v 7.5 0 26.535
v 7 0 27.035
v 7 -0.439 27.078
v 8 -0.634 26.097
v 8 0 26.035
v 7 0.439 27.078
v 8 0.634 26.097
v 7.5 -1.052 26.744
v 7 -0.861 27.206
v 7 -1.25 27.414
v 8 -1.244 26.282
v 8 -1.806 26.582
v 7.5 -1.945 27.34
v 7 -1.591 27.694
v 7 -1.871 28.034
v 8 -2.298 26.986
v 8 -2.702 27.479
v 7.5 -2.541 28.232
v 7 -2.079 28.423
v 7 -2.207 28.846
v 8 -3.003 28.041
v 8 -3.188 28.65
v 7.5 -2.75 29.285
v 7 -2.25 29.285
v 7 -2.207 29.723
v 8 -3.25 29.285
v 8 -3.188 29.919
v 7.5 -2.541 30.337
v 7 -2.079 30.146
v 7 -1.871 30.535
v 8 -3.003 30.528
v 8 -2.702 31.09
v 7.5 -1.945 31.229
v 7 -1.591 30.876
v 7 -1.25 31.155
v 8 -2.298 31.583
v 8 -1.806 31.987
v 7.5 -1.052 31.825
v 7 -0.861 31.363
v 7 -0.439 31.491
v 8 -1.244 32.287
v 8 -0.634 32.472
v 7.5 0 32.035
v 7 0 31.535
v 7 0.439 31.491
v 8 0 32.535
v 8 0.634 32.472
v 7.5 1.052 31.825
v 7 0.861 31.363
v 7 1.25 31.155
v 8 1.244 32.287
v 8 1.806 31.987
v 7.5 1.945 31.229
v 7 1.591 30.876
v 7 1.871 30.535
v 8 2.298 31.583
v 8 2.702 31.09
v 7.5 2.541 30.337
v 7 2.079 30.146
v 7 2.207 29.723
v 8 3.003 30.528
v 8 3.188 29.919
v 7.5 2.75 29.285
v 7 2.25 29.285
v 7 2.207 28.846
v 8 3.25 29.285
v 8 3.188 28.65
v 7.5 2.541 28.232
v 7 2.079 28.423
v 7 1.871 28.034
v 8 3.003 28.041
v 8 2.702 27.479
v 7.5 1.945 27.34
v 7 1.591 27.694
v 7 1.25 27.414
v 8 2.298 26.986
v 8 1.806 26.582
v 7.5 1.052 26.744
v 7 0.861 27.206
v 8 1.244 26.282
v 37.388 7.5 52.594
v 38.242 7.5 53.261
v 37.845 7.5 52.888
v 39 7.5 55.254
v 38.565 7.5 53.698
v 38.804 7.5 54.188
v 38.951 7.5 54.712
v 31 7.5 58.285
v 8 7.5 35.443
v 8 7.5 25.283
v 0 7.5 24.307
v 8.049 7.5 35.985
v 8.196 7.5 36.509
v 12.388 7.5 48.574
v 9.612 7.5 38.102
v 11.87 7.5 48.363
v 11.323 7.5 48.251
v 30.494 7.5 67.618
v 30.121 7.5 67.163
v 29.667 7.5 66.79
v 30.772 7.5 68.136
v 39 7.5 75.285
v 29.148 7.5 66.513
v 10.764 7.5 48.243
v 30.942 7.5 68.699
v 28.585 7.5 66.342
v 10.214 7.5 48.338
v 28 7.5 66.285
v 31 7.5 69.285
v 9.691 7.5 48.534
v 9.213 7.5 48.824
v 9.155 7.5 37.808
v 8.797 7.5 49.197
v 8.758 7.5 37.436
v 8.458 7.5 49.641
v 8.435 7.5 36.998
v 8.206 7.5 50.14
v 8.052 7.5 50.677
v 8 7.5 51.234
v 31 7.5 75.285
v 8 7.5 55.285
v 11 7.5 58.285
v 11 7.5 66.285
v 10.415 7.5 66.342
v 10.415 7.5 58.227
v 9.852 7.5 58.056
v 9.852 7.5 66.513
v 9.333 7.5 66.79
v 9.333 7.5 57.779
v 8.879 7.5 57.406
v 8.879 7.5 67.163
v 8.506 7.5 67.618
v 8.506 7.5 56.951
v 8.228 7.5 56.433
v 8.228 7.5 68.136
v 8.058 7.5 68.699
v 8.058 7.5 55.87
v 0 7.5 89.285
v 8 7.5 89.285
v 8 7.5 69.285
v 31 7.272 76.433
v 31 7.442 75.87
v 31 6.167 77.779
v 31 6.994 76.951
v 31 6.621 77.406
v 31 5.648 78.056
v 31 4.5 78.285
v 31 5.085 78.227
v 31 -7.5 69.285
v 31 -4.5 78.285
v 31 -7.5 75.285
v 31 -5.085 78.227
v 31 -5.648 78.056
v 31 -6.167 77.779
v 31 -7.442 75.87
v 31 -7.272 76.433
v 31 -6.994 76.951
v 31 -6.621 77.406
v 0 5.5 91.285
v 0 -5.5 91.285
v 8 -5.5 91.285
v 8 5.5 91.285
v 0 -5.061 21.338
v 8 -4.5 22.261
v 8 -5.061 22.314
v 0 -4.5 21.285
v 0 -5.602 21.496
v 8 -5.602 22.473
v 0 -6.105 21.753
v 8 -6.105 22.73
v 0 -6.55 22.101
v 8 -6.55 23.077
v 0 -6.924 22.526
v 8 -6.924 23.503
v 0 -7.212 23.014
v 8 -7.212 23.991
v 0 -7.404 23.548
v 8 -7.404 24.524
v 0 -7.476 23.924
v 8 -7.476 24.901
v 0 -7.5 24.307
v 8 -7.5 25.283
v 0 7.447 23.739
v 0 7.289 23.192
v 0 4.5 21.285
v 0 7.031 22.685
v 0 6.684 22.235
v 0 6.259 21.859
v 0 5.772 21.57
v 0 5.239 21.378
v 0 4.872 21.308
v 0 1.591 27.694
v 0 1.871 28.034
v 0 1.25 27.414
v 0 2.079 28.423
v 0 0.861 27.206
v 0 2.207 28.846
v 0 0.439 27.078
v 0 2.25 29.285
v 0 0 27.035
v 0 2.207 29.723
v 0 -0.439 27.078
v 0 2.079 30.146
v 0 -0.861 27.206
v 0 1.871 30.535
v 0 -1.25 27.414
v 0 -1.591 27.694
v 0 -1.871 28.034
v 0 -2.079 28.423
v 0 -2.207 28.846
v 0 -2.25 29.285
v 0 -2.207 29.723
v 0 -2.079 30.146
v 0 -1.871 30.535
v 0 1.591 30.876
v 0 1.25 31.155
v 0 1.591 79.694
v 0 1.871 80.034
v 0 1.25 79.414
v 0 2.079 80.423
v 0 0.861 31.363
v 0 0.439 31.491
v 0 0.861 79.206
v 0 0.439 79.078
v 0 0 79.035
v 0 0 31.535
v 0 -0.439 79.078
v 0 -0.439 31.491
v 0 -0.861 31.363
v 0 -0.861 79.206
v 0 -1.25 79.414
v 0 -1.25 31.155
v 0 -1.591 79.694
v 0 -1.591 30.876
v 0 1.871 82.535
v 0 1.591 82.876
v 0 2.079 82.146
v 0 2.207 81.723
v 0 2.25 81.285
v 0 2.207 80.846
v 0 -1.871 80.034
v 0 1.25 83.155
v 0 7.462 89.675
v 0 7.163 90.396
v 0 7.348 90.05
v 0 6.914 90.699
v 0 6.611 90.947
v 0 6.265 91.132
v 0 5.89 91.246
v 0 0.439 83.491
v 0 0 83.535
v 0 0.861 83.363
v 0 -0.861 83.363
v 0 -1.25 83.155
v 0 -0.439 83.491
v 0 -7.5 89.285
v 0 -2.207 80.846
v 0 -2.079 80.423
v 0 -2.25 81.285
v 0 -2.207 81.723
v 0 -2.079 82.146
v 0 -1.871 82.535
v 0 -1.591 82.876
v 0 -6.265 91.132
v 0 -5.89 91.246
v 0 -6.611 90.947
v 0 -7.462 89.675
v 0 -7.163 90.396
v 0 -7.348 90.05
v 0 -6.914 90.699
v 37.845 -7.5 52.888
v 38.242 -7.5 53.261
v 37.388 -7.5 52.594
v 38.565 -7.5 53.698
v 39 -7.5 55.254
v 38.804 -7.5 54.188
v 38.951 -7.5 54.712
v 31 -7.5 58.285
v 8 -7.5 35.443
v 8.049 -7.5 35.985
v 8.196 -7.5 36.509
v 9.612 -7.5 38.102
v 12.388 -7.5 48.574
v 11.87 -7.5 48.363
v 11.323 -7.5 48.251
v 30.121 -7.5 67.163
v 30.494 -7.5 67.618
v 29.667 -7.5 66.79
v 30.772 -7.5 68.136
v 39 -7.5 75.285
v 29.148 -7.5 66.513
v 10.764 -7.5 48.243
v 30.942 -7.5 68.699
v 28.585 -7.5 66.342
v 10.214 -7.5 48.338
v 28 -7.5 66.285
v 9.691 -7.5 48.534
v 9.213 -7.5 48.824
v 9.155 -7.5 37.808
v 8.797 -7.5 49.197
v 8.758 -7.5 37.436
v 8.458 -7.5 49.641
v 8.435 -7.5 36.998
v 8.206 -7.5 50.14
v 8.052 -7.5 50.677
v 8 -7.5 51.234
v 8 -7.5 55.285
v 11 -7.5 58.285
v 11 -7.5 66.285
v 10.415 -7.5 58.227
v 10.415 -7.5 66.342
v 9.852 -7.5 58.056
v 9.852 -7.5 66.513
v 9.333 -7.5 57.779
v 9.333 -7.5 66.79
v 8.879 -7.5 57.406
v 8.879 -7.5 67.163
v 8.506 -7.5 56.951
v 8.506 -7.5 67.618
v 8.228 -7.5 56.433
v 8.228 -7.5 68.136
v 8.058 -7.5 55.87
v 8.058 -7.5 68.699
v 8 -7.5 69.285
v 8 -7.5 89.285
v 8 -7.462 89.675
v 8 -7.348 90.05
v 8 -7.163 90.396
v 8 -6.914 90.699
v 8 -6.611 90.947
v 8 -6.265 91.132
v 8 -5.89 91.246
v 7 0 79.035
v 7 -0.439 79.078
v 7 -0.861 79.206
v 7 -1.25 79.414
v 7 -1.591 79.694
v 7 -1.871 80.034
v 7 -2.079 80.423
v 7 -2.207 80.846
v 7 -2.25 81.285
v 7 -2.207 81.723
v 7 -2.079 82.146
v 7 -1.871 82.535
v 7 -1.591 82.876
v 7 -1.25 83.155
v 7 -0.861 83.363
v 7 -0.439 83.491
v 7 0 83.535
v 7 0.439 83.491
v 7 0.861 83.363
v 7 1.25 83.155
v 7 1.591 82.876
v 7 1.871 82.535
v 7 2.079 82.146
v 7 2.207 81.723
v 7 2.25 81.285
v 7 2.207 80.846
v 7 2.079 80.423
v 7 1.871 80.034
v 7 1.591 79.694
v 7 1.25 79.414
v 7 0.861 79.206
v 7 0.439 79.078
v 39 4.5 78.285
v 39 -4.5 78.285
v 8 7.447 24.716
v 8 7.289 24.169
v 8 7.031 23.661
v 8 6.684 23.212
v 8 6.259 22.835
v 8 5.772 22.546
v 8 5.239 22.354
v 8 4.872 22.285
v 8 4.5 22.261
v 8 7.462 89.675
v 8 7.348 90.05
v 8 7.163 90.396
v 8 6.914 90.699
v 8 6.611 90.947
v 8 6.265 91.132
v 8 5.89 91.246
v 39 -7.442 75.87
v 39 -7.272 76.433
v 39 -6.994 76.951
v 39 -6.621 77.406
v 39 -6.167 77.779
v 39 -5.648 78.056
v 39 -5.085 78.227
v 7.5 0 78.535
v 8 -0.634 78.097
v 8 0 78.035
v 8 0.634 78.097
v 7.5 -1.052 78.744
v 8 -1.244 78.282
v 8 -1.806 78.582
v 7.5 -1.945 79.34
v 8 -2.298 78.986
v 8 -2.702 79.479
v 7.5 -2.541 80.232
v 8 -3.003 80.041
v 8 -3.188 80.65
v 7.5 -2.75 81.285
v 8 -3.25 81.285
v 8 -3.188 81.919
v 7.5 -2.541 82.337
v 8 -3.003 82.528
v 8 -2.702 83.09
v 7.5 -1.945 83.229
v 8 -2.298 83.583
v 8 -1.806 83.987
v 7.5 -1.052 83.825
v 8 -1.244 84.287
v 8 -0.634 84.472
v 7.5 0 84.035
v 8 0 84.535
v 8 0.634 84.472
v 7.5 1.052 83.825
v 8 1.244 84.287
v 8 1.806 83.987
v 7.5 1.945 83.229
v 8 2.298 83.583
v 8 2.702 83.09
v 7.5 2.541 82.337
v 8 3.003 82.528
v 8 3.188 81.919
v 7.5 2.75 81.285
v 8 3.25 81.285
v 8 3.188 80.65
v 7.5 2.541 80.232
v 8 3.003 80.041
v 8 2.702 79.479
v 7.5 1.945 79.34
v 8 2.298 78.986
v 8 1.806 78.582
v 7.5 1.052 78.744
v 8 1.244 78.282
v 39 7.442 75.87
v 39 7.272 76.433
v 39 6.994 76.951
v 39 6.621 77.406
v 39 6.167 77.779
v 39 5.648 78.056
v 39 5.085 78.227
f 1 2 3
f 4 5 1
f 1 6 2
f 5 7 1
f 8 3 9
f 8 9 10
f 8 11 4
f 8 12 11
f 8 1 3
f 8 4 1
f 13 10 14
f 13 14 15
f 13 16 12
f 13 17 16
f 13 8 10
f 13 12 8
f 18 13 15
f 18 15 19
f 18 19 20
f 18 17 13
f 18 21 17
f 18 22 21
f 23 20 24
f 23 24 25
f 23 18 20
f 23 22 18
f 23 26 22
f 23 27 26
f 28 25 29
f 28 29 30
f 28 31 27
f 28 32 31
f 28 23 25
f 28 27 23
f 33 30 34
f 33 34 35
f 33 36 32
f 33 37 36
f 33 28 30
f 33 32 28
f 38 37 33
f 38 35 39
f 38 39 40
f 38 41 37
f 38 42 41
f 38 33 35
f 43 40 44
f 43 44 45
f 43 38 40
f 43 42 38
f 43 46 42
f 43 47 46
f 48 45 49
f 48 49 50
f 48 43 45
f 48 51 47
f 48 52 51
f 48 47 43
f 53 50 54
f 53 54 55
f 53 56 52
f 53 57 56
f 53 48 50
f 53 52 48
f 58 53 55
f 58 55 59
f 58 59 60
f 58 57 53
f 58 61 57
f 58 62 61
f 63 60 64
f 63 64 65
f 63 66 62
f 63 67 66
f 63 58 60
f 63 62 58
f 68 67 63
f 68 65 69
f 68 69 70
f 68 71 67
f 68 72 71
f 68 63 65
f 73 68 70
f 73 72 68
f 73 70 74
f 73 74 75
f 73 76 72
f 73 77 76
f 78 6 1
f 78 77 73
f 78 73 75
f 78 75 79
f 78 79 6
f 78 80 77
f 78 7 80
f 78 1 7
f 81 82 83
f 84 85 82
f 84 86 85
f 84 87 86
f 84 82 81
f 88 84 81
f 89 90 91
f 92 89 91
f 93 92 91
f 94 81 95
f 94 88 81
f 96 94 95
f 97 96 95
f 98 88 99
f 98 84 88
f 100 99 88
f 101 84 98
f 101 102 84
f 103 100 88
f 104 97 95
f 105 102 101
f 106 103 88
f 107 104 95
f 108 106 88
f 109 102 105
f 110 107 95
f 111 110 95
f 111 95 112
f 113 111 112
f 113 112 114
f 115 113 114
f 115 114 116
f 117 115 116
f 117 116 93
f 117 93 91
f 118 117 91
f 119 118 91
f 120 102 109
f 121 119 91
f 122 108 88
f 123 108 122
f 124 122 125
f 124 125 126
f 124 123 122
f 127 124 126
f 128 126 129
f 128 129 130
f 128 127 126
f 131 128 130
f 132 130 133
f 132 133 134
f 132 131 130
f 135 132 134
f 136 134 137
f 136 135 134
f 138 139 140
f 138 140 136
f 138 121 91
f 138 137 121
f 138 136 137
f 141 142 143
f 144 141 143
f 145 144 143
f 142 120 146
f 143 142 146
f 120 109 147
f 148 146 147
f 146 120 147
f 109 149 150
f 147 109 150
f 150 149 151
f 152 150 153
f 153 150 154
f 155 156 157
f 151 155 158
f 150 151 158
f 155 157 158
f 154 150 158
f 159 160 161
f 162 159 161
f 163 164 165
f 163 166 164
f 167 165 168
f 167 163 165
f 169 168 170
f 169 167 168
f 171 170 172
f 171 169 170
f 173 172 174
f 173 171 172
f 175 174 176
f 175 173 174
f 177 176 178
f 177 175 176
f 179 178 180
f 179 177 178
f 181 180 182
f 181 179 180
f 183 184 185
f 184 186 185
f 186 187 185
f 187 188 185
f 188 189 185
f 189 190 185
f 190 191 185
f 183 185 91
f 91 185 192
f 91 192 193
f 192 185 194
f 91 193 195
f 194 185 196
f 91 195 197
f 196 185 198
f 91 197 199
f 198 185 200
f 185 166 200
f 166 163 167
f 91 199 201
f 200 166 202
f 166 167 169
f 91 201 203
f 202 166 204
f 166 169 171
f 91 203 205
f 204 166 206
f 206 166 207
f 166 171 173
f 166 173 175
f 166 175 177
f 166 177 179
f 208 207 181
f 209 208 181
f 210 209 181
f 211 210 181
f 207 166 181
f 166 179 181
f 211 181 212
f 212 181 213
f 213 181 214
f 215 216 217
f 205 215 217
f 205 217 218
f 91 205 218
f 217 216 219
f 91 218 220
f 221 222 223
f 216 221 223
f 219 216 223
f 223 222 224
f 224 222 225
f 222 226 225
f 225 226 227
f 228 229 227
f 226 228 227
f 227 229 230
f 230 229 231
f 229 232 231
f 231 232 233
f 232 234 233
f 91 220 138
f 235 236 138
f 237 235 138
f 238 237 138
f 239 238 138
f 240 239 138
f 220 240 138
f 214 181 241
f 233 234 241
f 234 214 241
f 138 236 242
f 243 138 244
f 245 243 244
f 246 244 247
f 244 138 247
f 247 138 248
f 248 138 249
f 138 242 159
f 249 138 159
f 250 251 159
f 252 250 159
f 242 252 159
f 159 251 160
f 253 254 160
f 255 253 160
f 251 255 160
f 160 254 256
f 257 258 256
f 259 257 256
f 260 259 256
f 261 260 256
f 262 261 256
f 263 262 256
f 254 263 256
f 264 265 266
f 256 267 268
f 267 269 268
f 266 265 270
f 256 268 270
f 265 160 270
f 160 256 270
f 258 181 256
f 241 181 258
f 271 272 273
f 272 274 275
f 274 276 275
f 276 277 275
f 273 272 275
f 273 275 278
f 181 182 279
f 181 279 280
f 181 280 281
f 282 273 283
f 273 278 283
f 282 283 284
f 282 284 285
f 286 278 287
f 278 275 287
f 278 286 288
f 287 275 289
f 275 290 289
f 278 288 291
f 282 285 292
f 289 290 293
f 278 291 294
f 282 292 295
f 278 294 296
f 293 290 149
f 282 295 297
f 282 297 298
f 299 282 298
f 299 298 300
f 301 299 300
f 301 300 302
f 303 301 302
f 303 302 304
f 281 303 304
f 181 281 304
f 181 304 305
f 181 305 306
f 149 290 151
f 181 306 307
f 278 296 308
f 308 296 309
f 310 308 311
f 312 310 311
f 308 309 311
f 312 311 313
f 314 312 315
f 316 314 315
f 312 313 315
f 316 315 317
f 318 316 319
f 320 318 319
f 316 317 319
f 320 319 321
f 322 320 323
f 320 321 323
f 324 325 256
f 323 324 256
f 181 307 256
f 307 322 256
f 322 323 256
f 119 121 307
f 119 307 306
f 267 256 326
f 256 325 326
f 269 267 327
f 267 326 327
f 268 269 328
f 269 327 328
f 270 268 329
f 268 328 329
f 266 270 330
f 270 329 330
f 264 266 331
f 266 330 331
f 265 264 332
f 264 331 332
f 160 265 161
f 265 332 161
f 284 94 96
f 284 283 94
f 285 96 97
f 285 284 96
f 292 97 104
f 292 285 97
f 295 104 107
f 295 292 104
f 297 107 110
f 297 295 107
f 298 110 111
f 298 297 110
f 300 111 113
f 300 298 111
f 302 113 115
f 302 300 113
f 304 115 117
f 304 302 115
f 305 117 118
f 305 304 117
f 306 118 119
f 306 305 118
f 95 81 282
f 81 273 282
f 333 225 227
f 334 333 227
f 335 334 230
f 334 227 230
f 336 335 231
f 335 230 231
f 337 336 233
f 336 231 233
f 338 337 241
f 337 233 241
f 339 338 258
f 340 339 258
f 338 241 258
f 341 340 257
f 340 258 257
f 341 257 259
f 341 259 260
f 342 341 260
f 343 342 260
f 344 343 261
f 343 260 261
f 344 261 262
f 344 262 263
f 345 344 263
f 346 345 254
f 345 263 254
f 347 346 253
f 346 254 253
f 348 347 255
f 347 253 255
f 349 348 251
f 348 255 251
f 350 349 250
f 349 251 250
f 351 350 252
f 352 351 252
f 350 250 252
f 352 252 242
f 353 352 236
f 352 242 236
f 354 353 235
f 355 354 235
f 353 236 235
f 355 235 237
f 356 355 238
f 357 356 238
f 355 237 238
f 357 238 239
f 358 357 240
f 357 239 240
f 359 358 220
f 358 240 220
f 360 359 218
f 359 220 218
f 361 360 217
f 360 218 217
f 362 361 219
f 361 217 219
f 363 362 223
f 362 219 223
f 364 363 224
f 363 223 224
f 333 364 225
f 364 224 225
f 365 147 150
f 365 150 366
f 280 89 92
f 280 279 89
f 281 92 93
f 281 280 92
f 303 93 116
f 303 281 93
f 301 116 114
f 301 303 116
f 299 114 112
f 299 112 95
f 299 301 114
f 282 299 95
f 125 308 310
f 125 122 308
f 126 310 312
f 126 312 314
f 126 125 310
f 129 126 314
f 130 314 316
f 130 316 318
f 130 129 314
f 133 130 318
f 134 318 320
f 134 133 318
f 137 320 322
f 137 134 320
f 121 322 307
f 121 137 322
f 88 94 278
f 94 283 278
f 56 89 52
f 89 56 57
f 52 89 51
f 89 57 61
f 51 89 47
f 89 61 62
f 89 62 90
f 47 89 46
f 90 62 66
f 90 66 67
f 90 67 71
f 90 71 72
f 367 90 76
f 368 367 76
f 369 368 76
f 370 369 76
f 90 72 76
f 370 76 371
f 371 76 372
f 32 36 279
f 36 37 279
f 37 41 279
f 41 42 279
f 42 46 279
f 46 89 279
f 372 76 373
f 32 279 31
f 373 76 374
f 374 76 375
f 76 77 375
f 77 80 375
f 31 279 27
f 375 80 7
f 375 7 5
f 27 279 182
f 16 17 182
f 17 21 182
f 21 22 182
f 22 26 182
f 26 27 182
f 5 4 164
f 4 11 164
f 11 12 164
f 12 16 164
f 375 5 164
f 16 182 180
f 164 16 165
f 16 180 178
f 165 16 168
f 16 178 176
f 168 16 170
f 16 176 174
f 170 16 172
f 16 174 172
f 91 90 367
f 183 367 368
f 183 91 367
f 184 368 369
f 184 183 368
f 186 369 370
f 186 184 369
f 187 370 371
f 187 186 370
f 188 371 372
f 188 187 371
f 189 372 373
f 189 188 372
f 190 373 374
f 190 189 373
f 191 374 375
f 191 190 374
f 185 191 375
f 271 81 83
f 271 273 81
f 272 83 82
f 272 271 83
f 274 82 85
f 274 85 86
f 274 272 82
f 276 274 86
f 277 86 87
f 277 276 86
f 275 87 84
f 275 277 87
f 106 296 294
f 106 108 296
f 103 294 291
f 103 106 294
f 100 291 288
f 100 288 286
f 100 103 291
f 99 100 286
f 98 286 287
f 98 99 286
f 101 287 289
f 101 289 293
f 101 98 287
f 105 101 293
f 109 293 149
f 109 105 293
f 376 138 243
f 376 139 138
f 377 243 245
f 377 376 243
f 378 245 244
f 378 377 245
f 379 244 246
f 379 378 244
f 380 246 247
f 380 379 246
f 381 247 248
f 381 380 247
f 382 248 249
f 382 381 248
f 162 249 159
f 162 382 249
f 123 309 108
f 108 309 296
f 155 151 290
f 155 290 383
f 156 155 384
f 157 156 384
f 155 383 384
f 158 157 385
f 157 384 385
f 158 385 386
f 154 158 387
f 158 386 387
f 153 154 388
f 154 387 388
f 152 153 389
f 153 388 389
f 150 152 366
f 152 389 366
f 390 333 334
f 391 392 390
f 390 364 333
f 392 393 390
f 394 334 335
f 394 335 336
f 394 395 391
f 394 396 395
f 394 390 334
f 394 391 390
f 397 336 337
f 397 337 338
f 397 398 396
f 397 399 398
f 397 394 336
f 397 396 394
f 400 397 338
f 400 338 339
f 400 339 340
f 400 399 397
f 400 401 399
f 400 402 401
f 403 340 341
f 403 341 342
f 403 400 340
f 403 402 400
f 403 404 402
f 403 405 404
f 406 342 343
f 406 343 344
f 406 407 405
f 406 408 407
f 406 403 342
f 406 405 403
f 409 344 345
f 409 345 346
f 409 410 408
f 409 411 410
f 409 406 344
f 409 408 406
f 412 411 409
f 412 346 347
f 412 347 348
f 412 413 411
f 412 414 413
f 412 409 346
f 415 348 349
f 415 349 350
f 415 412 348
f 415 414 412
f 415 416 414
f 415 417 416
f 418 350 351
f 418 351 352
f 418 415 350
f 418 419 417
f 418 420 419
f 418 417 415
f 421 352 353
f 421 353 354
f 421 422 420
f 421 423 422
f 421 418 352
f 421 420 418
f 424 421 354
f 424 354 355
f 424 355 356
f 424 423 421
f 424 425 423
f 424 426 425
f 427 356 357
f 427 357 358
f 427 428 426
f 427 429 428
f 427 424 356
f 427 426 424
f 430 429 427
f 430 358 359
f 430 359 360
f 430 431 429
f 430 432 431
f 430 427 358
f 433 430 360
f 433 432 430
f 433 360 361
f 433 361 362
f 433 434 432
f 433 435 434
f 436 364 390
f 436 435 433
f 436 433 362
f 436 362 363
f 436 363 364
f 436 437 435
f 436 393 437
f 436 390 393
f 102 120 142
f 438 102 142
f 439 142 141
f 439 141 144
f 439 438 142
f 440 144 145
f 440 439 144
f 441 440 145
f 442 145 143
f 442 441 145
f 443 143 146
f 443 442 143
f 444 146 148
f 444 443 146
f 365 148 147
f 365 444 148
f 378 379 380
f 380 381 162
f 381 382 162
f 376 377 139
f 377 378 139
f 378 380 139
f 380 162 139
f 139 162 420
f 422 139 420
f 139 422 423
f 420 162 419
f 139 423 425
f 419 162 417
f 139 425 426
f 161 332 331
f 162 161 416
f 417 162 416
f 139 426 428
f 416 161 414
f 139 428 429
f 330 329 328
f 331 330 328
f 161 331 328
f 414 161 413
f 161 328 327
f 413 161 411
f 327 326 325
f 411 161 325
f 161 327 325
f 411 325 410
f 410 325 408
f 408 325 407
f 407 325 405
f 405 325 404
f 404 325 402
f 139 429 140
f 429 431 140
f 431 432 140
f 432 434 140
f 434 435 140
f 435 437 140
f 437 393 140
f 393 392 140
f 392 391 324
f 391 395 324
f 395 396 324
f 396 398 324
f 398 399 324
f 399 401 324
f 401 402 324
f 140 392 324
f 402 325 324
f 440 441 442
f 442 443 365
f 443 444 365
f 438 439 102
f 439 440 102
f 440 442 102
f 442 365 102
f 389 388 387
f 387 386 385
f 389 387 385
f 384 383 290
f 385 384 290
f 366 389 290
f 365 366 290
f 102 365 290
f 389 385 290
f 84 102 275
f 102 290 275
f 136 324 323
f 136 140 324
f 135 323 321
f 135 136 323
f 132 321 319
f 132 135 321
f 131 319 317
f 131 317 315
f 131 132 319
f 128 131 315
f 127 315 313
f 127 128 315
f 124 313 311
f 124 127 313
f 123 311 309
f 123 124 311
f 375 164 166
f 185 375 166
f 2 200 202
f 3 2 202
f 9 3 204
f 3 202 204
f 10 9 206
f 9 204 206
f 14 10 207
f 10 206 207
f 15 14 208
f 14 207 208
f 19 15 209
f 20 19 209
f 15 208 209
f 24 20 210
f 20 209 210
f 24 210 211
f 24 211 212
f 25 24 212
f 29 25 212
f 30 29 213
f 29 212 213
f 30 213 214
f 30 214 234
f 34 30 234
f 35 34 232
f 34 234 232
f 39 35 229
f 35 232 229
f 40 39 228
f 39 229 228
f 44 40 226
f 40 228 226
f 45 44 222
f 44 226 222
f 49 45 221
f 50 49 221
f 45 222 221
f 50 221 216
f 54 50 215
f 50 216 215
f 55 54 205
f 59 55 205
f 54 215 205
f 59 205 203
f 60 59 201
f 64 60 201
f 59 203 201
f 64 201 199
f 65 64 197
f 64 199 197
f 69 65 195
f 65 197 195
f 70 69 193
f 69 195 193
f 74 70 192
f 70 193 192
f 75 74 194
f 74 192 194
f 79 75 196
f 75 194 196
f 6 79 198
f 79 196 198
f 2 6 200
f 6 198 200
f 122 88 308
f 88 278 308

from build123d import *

# Parameters (mm, degrees)
PAD_DEPTH    = 7.5
SKETCH001_R  = 2.25
POCKET_DEPTH = 8
CHAMFER_SIZE = 1
FILLET_R     = 2
FILLET001_R  = 3
FILLET002_R  = 3
FILLET003_R  = 3


with BuildPart() as part:
    # Sketch → Pad (new body, symmetric)
    with BuildSketch(Plane.XZ):
        Polygon((0, 21.284523), (0, 91.284523), (8, 91.284523), (8, 66.284523), (31, 66.284523), (31, 78.284523), (39, 78.284523), (39, 53.435047), (8, 37.261134), (8, 22.261134), align=None)
        Polygon((8, 58.284523), (8, 46.284523), (31, 58.284523), align=None, mode=Mode.SUBTRACT)
    extrude(amount=PAD_DEPTH, both=True)

    # Sketch001 (on Face1 of Pad) → Pocket (cut)
    with BuildSketch(Plane(origin=(0, 0, 0), x_dir=(0, 0, -1), z_dir=(-1, 0, 0))):
        with Locations((-81.284523, 0)):
            Circle(SKETCH001_R)
        with Locations((-29.284523, 0)):
            Circle(SKETCH001_R)
    extrude(amount=-POCKET_DEPTH, mode=Mode.SUBTRACT)

    # Chamfer
    chamfer_edges = [part.edges().sort_by_distance(p)[0] for p in [
        (8, 0, 83.534523),
        (8, 0, 31.534523),
    ]]
    chamfer(chamfer_edges, length=CHAMFER_SIZE)

    # Fillet
    fillet_edges = [part.edges().sort_by_distance(p)[0] for p in [
        (4, -7.5, 91.284523),
        (4, 7.5, 91.284523),
    ]]
    fillet(fillet_edges, radius=FILLET_R)

    # Fillet001
    fillet001_edges = [part.edges().sort_by_distance(p)[0] for p in [
        (39, 0, 53.435047),
        (4, -7.5, 21.772828),
        (4, 7.5, 21.772828),
    ]]
    fillet(fillet001_edges, radius=FILLET001_R)

    # Fillet002
    fillet002_edges = [part.edges().sort_by_distance(p)[0] for p in [
        (35, -7.5, 78.284523),
        (35, 7.5, 78.284523),
        (8, 0, 37.261134),
    ]]
    fillet(fillet002_edges, radius=FILLET002_R)

    # Fillet003
    fillet003_edges = [part.edges().sort_by_distance(p)[0] for p in [
        (8, 0, 58.284523),
        (8, 0, 46.284523),
        (8, 0, 66.284523),
        (31, 0, 66.284523),
    ]]
    fillet(fillet003_edges, radius=FILLET003_R)


solid = part.part
